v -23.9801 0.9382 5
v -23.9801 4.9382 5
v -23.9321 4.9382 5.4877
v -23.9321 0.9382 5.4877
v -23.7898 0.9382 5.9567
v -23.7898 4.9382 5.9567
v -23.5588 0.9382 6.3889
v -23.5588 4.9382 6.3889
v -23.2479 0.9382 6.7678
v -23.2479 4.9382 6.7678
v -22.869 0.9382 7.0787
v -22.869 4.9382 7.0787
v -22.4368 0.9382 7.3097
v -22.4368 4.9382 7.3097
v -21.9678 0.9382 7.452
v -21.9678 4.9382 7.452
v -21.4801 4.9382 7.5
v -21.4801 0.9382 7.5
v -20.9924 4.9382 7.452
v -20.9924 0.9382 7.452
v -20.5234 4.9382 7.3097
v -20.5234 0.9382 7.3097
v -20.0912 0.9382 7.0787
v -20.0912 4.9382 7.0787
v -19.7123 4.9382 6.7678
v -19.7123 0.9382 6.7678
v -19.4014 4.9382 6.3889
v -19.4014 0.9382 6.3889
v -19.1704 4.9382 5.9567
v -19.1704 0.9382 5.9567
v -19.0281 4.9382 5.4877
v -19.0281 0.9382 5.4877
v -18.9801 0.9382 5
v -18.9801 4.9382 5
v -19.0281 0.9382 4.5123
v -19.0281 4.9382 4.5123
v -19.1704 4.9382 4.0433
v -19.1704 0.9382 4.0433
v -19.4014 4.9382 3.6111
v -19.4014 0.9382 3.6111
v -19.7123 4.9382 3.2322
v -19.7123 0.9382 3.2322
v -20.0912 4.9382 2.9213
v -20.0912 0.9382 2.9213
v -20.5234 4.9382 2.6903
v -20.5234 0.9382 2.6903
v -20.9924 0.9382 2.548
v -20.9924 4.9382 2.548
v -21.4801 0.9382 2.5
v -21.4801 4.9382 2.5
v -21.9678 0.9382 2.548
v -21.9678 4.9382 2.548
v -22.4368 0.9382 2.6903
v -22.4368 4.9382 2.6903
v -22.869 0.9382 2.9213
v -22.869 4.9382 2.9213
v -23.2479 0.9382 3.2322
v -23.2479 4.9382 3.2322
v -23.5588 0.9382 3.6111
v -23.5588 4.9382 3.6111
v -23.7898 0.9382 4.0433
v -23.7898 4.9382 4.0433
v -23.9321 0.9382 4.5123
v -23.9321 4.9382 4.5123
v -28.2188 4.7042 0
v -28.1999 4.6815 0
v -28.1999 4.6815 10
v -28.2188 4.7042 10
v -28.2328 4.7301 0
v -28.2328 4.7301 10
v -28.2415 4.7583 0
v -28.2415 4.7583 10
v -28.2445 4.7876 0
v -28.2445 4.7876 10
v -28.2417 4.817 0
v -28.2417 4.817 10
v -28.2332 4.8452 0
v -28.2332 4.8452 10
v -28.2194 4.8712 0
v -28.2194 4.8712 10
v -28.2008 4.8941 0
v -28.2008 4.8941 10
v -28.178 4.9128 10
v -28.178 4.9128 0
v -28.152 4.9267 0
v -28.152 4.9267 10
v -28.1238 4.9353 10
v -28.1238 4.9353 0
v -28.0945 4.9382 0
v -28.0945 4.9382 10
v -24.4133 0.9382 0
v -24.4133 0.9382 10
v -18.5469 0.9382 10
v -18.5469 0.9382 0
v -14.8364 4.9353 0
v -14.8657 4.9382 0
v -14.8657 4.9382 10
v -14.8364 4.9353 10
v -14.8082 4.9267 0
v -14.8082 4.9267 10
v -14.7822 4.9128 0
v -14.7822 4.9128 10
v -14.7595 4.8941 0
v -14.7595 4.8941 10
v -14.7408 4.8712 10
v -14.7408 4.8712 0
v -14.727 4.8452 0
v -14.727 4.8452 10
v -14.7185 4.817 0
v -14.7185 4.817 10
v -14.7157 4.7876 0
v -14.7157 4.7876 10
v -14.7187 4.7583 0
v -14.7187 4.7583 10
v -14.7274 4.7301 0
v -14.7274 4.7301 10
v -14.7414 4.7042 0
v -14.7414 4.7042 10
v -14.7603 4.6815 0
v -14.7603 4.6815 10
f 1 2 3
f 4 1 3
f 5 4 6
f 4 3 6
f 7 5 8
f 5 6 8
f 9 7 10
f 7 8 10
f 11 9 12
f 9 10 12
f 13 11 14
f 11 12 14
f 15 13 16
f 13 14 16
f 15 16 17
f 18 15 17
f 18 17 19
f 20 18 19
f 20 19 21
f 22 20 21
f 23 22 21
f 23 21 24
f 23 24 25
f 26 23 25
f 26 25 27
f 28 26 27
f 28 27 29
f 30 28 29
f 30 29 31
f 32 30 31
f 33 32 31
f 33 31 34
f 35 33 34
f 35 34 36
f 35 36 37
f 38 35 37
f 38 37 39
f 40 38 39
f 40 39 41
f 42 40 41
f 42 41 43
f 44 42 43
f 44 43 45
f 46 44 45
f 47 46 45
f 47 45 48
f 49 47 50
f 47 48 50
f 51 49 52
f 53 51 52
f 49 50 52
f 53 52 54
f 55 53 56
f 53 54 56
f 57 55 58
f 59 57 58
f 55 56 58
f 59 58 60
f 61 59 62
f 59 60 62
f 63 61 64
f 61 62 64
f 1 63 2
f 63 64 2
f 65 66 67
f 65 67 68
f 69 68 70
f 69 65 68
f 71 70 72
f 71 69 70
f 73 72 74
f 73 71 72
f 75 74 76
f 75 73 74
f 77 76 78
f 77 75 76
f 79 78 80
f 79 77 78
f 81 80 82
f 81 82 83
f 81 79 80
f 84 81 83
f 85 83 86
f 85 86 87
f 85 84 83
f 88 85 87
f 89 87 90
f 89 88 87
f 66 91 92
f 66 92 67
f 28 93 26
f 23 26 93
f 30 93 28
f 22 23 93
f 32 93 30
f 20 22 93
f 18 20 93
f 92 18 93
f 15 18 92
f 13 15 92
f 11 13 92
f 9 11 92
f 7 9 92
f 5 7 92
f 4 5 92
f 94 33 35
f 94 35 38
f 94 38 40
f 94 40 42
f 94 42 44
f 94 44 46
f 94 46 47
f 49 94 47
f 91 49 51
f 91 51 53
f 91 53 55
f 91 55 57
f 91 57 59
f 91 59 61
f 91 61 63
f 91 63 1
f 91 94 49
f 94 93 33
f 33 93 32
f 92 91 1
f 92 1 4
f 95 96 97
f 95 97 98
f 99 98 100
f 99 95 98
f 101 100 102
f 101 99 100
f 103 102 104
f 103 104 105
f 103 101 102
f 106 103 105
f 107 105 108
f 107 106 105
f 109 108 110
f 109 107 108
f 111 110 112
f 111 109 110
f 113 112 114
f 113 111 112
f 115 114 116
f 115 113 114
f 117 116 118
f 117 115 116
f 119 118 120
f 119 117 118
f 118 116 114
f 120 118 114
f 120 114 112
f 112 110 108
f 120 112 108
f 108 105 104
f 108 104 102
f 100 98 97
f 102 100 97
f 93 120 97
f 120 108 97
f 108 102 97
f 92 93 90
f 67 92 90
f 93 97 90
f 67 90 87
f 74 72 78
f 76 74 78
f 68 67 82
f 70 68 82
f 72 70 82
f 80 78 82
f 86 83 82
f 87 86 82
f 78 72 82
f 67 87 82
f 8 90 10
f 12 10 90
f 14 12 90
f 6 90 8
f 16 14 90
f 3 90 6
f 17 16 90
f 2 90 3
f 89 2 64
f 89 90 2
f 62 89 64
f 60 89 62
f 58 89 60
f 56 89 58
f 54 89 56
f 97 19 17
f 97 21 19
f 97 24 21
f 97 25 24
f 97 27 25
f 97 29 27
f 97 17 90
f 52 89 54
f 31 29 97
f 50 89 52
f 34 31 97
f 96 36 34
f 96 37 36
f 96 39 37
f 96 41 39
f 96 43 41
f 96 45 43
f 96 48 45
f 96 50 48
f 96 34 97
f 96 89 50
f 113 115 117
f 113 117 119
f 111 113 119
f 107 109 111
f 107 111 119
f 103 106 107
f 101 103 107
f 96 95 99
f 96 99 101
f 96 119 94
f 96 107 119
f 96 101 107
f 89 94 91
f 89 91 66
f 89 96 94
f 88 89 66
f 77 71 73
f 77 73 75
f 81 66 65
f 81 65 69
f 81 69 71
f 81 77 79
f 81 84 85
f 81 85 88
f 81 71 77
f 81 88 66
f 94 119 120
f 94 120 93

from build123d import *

# Parameters (mm, degrees)
BOSS_EXTRUDE1_DEPTH = 10
SKETCH2_R           = 2.5
CUT_EXTRUDE1_DEPTH  = 31.22831719


with BuildPart() as part:
    # Sketch1 → Boss-Extrude1 (new body)
    with BuildSketch(Plane.XY):
        with BuildLine():
            Line((-18.283811633, 4.93818979), (-14.865726836, 4.93818979))
            ThreePointArc((-14.865726836, 4.93818979), (-14.726980342, 4.84519339), (-14.760272841, 4.681515262))
            Line((-14.760272841, 4.681515262), (-18.546923839, 0.93818979))
            Line((-18.546923839, 0.93818979), (-24.41329202, 0.93818979))
            Line((-24.41329202, 0.93818979), (-28.199943018, 4.681515262))
            ThreePointArc((-28.199943018, 4.681515262), (-28.233235517, 4.84519339), (-28.094489023, 4.93818979))
            Line((-28.094489023, 4.93818979), (-24.676404226, 4.93818979))
            Line((-24.676404226, 4.93818979), (-18.283811633, 4.93818979))
        make_face()
    extrude(amount=BOSS_EXTRUDE1_DEPTH)

    # Sketch2 → Cut-Extrude1 (cut, through all)
    with BuildSketch(Plane(origin=(0, 4.93818979, 0), x_dir=(1, 0, 0), z_dir=(0, 1, 0))):
        with Locations(Location((-21.480107929, -5, 0), (0, 0, 180))):
            Circle(SKETCH2_R)
    extrude(amount=-CUT_EXTRUDE1_DEPTH, mode=Mode.SUBTRACT)


solid = part.part
